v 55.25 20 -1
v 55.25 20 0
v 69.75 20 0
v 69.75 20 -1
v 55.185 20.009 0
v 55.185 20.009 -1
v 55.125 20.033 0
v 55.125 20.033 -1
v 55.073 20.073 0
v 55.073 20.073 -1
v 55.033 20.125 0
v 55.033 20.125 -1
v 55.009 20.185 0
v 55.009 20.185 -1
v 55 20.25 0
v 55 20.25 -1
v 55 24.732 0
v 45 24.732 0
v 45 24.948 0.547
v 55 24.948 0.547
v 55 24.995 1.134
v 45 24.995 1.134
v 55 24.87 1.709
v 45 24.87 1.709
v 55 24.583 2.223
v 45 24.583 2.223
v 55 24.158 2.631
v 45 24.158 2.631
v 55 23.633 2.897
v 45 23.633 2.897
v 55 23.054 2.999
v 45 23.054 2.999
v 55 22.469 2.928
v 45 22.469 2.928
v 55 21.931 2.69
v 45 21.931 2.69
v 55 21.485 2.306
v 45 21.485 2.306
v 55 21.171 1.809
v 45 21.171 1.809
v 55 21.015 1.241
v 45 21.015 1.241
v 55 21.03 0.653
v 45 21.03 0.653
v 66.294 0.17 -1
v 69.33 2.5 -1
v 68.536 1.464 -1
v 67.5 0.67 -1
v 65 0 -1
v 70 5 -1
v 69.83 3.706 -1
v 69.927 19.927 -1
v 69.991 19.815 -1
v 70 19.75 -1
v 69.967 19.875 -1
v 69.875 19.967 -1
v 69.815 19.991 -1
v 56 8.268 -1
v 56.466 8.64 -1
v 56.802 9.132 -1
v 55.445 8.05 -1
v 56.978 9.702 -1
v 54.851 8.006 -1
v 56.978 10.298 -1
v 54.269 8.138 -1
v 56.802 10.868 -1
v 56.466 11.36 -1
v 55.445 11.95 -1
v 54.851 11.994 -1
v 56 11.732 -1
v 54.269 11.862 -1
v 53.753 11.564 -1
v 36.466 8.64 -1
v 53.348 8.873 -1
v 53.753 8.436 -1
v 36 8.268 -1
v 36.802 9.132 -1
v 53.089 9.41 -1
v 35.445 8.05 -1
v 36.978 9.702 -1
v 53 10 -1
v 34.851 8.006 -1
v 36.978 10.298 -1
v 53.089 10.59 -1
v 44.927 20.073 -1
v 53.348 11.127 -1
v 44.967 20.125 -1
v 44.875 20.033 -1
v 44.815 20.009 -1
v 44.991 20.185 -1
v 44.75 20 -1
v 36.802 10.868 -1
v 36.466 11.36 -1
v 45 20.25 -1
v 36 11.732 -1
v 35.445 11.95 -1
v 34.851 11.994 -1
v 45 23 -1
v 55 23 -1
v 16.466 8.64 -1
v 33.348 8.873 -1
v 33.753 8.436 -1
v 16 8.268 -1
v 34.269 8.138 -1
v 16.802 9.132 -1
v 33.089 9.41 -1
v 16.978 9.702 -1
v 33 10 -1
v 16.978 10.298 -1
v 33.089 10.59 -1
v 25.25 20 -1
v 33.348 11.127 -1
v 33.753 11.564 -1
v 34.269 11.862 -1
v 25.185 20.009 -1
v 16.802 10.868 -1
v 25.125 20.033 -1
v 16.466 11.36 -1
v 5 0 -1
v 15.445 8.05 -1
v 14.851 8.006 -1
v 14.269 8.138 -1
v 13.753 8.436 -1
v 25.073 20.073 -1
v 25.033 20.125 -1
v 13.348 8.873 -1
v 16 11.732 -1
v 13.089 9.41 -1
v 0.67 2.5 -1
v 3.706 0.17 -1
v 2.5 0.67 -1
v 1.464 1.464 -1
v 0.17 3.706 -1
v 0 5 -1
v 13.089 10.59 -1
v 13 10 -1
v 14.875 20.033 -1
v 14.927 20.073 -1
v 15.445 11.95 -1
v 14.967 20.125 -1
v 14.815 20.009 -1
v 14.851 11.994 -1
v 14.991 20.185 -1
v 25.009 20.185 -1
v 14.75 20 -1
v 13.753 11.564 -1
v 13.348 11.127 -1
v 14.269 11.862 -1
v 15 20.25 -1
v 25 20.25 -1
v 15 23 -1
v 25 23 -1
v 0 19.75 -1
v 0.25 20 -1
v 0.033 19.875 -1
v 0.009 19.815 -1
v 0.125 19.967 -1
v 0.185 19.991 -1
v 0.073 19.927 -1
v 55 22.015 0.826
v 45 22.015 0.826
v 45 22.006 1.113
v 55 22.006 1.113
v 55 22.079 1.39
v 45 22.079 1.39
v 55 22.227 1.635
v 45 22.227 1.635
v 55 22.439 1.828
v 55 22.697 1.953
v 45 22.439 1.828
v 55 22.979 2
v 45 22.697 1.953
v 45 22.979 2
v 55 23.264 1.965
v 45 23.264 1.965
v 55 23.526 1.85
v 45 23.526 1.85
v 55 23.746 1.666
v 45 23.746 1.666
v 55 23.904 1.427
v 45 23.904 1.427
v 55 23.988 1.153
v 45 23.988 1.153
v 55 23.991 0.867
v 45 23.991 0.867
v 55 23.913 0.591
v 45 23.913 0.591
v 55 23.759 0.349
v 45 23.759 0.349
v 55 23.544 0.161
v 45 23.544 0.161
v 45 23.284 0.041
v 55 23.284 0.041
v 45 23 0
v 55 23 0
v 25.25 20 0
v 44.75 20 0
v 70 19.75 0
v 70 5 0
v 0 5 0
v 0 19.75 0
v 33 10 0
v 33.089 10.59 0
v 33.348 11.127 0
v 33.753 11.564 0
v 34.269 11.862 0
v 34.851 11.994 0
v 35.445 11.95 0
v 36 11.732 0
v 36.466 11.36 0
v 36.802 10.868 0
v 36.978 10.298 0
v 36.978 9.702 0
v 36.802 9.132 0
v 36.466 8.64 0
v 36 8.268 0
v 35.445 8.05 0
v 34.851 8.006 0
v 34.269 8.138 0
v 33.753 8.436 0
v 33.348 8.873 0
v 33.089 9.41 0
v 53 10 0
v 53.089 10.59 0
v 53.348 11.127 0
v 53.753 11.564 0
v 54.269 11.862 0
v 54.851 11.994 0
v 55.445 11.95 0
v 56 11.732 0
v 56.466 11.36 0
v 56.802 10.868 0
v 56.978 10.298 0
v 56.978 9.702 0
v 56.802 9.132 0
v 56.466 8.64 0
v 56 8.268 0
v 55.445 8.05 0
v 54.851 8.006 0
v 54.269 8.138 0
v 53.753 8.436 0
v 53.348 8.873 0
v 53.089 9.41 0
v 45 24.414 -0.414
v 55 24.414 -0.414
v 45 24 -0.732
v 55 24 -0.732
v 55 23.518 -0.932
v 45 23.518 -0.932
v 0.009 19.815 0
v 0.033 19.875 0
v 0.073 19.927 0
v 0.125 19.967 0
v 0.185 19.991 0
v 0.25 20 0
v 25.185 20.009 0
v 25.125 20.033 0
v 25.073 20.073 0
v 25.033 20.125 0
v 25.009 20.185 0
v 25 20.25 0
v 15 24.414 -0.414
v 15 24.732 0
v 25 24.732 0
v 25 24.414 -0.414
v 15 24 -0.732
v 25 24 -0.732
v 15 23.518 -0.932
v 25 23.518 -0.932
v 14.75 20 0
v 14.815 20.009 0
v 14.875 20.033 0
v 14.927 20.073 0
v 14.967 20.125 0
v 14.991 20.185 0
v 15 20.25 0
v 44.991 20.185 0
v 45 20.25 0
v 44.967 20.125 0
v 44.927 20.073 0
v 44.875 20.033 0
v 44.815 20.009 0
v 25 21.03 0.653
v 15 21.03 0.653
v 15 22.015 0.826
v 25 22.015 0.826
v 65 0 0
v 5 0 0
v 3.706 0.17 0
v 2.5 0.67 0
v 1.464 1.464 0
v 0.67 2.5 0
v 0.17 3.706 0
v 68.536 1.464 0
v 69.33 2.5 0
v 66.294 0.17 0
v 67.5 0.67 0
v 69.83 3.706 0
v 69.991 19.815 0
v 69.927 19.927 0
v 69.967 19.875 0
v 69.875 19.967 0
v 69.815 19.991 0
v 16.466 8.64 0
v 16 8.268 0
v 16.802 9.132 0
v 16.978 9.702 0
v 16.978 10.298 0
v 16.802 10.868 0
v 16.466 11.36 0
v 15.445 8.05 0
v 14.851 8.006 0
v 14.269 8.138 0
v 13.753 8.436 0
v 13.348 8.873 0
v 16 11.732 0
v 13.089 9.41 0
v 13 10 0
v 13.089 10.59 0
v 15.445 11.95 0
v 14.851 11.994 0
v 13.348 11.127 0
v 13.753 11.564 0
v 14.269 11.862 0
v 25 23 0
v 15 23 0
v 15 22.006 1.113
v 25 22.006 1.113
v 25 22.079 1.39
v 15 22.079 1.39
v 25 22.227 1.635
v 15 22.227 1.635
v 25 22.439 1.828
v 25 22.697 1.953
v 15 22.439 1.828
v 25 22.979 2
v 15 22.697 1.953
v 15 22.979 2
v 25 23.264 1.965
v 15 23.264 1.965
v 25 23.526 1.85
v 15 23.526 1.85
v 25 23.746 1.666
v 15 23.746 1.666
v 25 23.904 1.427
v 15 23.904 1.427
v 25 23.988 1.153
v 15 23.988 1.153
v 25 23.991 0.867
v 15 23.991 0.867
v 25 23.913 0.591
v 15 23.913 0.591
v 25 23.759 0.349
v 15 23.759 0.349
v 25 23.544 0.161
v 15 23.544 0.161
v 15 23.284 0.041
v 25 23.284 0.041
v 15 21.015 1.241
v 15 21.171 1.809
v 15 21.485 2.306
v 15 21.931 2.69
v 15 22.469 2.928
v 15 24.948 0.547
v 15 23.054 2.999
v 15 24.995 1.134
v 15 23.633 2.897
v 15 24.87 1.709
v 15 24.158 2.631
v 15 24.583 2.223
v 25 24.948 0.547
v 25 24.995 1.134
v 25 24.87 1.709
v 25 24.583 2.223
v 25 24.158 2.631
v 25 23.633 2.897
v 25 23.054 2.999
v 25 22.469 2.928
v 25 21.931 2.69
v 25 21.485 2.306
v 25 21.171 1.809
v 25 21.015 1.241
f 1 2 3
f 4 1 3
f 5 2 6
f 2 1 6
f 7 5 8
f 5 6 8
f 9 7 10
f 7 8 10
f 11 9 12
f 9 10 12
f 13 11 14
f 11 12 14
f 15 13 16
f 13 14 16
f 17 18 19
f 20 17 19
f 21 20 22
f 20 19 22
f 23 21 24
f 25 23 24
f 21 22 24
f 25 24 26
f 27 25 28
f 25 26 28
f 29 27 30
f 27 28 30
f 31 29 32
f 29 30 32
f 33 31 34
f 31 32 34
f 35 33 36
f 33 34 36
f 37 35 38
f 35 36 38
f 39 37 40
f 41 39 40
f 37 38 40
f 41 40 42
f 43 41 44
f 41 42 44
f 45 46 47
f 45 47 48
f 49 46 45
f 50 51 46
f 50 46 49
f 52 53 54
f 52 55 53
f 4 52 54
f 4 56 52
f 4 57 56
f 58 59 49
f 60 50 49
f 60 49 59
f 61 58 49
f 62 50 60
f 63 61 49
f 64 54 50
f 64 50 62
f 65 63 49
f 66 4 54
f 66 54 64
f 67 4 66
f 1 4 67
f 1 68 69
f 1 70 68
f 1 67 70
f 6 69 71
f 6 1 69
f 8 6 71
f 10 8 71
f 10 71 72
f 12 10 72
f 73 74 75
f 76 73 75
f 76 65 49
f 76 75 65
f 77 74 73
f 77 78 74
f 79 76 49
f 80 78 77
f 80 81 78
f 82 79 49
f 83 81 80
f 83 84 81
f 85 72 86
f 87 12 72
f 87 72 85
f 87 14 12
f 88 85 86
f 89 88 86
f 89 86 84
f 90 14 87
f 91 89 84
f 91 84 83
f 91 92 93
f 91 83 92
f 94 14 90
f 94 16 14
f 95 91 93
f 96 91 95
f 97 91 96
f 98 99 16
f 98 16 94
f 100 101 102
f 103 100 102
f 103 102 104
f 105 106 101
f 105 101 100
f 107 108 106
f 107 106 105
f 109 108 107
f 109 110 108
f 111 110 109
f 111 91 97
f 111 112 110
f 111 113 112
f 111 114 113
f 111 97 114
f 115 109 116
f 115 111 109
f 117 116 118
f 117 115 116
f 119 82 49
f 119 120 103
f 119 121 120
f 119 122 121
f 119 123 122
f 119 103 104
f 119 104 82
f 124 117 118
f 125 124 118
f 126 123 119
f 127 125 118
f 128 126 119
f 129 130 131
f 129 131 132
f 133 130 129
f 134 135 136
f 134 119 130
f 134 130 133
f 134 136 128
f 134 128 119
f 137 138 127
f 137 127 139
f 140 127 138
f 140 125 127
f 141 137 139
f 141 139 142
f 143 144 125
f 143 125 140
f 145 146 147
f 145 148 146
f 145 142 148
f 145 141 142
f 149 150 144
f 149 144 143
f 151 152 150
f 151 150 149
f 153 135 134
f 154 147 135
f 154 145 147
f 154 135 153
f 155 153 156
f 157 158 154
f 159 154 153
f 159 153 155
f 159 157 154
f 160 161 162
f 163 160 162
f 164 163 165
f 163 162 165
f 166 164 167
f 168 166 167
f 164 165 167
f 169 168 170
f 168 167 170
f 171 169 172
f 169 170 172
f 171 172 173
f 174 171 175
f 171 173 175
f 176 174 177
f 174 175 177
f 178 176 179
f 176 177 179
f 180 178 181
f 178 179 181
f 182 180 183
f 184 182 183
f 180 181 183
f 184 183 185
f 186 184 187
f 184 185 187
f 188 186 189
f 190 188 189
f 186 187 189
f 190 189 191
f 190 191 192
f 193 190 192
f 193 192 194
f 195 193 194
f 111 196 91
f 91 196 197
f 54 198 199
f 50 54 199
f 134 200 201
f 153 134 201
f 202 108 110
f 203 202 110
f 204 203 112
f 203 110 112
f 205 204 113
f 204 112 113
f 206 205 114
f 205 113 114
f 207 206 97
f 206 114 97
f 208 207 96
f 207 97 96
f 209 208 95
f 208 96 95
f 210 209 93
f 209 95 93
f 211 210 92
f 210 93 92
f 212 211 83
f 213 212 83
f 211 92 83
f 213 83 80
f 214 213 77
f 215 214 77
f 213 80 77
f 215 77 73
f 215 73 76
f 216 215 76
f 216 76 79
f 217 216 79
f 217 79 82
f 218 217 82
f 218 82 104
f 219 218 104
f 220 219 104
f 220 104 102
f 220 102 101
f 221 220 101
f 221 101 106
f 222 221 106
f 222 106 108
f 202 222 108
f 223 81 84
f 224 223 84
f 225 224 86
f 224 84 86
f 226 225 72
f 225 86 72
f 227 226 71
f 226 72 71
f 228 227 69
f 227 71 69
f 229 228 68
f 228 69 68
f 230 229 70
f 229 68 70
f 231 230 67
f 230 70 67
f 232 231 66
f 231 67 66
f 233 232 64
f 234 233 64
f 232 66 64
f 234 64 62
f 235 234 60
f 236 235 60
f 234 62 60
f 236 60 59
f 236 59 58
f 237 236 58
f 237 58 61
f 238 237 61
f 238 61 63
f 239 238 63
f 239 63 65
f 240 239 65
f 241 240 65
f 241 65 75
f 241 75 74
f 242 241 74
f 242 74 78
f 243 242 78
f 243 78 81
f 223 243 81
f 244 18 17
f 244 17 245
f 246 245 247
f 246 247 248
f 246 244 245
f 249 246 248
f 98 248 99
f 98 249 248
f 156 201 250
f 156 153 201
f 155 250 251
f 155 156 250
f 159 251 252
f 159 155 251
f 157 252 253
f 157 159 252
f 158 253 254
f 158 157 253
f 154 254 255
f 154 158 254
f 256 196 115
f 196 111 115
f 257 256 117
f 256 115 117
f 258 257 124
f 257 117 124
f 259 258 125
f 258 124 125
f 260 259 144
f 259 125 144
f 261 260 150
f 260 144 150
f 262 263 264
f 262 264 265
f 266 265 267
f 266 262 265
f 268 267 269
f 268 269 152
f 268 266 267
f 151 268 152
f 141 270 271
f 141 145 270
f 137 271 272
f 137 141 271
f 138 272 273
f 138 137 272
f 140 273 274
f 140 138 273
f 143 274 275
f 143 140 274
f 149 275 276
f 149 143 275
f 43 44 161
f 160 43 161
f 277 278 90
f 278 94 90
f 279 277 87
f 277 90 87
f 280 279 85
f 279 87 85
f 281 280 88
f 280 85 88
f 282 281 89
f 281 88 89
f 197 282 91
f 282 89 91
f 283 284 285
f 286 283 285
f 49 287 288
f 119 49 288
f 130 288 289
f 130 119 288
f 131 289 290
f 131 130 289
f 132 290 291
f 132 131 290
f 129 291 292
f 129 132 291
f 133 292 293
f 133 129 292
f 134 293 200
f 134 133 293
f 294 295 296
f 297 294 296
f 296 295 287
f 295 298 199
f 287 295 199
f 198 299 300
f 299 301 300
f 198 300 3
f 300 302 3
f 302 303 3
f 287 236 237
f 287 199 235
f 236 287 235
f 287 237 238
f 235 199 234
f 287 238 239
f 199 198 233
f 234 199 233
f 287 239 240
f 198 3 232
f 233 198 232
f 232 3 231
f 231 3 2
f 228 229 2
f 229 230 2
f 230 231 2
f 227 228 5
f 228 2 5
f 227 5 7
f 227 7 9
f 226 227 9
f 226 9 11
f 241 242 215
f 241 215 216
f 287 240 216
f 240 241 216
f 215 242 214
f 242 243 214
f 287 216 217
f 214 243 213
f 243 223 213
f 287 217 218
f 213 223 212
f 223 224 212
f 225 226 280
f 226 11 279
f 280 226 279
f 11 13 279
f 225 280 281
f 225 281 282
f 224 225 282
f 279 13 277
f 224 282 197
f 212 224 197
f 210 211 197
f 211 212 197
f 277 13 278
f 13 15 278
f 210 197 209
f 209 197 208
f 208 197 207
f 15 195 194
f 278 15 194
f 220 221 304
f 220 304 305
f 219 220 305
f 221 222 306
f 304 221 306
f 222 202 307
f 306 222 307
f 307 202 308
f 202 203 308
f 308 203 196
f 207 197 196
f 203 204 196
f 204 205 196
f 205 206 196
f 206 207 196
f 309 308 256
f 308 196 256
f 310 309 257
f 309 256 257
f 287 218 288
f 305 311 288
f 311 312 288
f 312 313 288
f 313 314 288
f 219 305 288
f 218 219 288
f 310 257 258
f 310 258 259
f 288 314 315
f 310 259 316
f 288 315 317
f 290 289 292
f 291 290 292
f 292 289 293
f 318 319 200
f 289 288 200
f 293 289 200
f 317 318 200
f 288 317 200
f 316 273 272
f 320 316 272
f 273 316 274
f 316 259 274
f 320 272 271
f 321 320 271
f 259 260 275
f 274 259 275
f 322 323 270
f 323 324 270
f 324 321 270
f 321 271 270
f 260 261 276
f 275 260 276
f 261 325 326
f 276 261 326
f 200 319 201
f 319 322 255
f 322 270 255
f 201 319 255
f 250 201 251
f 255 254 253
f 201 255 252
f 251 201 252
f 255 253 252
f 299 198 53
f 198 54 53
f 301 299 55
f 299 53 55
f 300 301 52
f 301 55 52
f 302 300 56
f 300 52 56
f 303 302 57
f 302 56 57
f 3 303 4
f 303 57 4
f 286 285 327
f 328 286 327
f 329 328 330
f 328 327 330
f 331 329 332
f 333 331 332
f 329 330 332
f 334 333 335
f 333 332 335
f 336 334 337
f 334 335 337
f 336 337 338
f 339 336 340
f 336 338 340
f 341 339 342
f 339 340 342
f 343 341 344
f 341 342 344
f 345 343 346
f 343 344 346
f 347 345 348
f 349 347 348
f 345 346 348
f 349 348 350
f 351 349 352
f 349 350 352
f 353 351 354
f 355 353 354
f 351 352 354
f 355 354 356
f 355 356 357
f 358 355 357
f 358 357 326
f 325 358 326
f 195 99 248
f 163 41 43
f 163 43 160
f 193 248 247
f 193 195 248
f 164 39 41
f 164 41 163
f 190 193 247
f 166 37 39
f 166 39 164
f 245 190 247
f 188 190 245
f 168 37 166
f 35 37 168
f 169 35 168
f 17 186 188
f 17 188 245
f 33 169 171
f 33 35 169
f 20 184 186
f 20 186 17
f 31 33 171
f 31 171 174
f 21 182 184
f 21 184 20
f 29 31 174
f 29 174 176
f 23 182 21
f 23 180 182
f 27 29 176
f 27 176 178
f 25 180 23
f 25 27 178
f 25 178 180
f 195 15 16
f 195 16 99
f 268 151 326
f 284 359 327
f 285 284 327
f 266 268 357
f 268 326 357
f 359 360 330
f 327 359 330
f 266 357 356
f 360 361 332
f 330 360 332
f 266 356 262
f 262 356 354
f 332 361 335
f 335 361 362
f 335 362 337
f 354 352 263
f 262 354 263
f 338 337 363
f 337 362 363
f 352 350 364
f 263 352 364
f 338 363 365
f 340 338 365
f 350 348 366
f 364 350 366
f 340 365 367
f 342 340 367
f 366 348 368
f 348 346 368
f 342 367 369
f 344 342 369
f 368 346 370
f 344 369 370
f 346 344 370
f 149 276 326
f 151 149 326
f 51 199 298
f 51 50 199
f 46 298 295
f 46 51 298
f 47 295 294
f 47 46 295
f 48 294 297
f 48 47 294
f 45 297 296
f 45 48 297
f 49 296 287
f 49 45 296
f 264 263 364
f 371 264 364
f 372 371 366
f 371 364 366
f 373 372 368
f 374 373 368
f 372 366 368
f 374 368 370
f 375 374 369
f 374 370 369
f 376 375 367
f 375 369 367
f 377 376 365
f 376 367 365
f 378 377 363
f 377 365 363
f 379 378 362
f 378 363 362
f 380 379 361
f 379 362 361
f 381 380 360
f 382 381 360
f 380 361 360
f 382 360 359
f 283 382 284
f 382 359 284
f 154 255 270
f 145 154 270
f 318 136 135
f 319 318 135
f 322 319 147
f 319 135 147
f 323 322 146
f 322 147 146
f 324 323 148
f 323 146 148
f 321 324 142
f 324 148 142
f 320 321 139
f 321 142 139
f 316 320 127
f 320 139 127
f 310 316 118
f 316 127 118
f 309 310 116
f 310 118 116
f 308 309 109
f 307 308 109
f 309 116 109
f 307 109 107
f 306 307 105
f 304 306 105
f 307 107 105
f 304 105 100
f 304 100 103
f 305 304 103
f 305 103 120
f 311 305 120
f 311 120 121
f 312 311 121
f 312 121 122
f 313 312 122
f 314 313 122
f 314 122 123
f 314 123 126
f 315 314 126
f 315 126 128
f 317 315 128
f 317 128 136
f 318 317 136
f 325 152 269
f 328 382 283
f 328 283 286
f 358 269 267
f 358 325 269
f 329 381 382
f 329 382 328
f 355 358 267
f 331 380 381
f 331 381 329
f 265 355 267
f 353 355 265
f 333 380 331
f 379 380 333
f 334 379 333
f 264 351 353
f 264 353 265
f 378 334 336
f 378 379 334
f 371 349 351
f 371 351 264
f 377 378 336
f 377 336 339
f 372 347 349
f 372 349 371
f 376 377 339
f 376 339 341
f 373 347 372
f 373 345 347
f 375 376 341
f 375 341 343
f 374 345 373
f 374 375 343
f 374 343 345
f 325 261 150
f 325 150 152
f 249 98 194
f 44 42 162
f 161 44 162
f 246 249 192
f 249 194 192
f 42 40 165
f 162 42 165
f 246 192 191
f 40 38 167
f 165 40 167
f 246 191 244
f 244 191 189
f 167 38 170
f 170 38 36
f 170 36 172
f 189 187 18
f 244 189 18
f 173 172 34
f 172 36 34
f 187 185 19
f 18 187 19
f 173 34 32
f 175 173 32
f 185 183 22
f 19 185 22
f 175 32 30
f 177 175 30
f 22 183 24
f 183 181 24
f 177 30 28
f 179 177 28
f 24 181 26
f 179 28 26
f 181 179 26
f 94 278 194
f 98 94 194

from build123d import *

# Parameters (mm, degrees)
SM_BASE_FLANGE_1_DEPTH = 1
OTHER_START            = 15
OTHER_1_DEPTH          = 40
OTHER_1_2_DEPTH        = 10
OTHER_START_2          = 45
OTHER_1_3_DEPTH        = 10
HOLE_WIZARD_M12_1_D    = 4
FILLET_1_R             = 5
FILLET_2_R             = 0.25


# Read off the part's stored shape, not the designer's step: 햄1
# Sheet-metal steps are written as plain solids
with BuildPart() as part:
    # Sketch 1 → 베이스-플랜지1 (new body)
    with BuildSketch(Plane.XY):
        Polygon((0, 0), (0, 20), (15, 20), (15, 25), (25, 25), (25, 20), (45, 20), (45, 25), (55, 25), (55, 20), (70, 20), (70, 0), align=None)
    extrude(amount=-SM_BASE_FLANGE_1_DEPTH)

    # Other 1 outline → Other 1 (cut)
    with BuildSketch(Plane.YZ.offset(OTHER_START)):
        with BuildLine():
            Line((25, 0), (24.732050807, 0))
            ThreePointArc((24.732050807, 0), (24, -0.732050808), (23, -1))
            Line((23, -1), (25, -1))
            Line((25, -1), (25, 0))
        make_face()
    extrude(amount=OTHER_1_DEPTH, mode=Mode.SUBTRACT)

    # Other 1 2 outline → Other 1 2 (add)
    with BuildSketch(Plane.YZ.offset(OTHER_START)):
        with BuildLine():
            Line((21.030384494, 0.652703645), (22.015192247, 0.826351822))
            ThreePointArc((22.015192247, 0.826351822), (23.64278761, 1.766044443), (23, 0))
            Line((23, 0), (24.732050807, 0))
            ThreePointArc((24.732050807, 0), (23.347296355, 2.969615506), (21.030384494, 0.652703645))
        make_face()
    extrude(amount=OTHER_1_2_DEPTH)

    # Other 1 3 outline → Other 1 3 (add)
    with BuildSketch(Plane.YZ.offset(OTHER_START_2)):
        with BuildLine():
            Line((21.030384494, 0.652703645), (22.015192247, 0.826351822))
            ThreePointArc((22.015192247, 0.826351822), (23.64278761, 1.766044443), (23, 0))
            Line((23, 0), (24.732050807, 0))
            ThreePointArc((24.732050807, 0), (23.347296355, 2.969615506), (21.030384494, 0.652703645))
        make_face()
    extrude(amount=OTHER_1_3_DEPTH)

    # M12 여유 구멍1 (through all)
    with Locations(Plane(origin=(15, 10, 0), x_dir=(1, 0, 0), z_dir=(0, 0, 1))):
        with Locations((0, 0), (20, 0), (40, 0)):
            Hole(HOLE_WIZARD_M12_1_D / 2)

    # 필렛1
    fillet_1_edges = [part.edges().sort_by_distance(p)[0] for p in [
        (0, 0, -0.5),
        (70, 0, -0.5),
    ]]
    fillet(fillet_1_edges, radius=FILLET_1_R)

    # 필렛2
    fillet_2_edges = [part.edges().sort_by_distance(p)[0] for p in [
        (0, 20, -0.5),
        (15, 20, -0.5),
        (25, 20, -0.5),
        (45, 20, -0.5),
        (55, 20, -0.5),
        (70, 20, -0.5),
    ]]
    fillet(fillet_2_edges, radius=FILLET_2_R)


solid = part.part
